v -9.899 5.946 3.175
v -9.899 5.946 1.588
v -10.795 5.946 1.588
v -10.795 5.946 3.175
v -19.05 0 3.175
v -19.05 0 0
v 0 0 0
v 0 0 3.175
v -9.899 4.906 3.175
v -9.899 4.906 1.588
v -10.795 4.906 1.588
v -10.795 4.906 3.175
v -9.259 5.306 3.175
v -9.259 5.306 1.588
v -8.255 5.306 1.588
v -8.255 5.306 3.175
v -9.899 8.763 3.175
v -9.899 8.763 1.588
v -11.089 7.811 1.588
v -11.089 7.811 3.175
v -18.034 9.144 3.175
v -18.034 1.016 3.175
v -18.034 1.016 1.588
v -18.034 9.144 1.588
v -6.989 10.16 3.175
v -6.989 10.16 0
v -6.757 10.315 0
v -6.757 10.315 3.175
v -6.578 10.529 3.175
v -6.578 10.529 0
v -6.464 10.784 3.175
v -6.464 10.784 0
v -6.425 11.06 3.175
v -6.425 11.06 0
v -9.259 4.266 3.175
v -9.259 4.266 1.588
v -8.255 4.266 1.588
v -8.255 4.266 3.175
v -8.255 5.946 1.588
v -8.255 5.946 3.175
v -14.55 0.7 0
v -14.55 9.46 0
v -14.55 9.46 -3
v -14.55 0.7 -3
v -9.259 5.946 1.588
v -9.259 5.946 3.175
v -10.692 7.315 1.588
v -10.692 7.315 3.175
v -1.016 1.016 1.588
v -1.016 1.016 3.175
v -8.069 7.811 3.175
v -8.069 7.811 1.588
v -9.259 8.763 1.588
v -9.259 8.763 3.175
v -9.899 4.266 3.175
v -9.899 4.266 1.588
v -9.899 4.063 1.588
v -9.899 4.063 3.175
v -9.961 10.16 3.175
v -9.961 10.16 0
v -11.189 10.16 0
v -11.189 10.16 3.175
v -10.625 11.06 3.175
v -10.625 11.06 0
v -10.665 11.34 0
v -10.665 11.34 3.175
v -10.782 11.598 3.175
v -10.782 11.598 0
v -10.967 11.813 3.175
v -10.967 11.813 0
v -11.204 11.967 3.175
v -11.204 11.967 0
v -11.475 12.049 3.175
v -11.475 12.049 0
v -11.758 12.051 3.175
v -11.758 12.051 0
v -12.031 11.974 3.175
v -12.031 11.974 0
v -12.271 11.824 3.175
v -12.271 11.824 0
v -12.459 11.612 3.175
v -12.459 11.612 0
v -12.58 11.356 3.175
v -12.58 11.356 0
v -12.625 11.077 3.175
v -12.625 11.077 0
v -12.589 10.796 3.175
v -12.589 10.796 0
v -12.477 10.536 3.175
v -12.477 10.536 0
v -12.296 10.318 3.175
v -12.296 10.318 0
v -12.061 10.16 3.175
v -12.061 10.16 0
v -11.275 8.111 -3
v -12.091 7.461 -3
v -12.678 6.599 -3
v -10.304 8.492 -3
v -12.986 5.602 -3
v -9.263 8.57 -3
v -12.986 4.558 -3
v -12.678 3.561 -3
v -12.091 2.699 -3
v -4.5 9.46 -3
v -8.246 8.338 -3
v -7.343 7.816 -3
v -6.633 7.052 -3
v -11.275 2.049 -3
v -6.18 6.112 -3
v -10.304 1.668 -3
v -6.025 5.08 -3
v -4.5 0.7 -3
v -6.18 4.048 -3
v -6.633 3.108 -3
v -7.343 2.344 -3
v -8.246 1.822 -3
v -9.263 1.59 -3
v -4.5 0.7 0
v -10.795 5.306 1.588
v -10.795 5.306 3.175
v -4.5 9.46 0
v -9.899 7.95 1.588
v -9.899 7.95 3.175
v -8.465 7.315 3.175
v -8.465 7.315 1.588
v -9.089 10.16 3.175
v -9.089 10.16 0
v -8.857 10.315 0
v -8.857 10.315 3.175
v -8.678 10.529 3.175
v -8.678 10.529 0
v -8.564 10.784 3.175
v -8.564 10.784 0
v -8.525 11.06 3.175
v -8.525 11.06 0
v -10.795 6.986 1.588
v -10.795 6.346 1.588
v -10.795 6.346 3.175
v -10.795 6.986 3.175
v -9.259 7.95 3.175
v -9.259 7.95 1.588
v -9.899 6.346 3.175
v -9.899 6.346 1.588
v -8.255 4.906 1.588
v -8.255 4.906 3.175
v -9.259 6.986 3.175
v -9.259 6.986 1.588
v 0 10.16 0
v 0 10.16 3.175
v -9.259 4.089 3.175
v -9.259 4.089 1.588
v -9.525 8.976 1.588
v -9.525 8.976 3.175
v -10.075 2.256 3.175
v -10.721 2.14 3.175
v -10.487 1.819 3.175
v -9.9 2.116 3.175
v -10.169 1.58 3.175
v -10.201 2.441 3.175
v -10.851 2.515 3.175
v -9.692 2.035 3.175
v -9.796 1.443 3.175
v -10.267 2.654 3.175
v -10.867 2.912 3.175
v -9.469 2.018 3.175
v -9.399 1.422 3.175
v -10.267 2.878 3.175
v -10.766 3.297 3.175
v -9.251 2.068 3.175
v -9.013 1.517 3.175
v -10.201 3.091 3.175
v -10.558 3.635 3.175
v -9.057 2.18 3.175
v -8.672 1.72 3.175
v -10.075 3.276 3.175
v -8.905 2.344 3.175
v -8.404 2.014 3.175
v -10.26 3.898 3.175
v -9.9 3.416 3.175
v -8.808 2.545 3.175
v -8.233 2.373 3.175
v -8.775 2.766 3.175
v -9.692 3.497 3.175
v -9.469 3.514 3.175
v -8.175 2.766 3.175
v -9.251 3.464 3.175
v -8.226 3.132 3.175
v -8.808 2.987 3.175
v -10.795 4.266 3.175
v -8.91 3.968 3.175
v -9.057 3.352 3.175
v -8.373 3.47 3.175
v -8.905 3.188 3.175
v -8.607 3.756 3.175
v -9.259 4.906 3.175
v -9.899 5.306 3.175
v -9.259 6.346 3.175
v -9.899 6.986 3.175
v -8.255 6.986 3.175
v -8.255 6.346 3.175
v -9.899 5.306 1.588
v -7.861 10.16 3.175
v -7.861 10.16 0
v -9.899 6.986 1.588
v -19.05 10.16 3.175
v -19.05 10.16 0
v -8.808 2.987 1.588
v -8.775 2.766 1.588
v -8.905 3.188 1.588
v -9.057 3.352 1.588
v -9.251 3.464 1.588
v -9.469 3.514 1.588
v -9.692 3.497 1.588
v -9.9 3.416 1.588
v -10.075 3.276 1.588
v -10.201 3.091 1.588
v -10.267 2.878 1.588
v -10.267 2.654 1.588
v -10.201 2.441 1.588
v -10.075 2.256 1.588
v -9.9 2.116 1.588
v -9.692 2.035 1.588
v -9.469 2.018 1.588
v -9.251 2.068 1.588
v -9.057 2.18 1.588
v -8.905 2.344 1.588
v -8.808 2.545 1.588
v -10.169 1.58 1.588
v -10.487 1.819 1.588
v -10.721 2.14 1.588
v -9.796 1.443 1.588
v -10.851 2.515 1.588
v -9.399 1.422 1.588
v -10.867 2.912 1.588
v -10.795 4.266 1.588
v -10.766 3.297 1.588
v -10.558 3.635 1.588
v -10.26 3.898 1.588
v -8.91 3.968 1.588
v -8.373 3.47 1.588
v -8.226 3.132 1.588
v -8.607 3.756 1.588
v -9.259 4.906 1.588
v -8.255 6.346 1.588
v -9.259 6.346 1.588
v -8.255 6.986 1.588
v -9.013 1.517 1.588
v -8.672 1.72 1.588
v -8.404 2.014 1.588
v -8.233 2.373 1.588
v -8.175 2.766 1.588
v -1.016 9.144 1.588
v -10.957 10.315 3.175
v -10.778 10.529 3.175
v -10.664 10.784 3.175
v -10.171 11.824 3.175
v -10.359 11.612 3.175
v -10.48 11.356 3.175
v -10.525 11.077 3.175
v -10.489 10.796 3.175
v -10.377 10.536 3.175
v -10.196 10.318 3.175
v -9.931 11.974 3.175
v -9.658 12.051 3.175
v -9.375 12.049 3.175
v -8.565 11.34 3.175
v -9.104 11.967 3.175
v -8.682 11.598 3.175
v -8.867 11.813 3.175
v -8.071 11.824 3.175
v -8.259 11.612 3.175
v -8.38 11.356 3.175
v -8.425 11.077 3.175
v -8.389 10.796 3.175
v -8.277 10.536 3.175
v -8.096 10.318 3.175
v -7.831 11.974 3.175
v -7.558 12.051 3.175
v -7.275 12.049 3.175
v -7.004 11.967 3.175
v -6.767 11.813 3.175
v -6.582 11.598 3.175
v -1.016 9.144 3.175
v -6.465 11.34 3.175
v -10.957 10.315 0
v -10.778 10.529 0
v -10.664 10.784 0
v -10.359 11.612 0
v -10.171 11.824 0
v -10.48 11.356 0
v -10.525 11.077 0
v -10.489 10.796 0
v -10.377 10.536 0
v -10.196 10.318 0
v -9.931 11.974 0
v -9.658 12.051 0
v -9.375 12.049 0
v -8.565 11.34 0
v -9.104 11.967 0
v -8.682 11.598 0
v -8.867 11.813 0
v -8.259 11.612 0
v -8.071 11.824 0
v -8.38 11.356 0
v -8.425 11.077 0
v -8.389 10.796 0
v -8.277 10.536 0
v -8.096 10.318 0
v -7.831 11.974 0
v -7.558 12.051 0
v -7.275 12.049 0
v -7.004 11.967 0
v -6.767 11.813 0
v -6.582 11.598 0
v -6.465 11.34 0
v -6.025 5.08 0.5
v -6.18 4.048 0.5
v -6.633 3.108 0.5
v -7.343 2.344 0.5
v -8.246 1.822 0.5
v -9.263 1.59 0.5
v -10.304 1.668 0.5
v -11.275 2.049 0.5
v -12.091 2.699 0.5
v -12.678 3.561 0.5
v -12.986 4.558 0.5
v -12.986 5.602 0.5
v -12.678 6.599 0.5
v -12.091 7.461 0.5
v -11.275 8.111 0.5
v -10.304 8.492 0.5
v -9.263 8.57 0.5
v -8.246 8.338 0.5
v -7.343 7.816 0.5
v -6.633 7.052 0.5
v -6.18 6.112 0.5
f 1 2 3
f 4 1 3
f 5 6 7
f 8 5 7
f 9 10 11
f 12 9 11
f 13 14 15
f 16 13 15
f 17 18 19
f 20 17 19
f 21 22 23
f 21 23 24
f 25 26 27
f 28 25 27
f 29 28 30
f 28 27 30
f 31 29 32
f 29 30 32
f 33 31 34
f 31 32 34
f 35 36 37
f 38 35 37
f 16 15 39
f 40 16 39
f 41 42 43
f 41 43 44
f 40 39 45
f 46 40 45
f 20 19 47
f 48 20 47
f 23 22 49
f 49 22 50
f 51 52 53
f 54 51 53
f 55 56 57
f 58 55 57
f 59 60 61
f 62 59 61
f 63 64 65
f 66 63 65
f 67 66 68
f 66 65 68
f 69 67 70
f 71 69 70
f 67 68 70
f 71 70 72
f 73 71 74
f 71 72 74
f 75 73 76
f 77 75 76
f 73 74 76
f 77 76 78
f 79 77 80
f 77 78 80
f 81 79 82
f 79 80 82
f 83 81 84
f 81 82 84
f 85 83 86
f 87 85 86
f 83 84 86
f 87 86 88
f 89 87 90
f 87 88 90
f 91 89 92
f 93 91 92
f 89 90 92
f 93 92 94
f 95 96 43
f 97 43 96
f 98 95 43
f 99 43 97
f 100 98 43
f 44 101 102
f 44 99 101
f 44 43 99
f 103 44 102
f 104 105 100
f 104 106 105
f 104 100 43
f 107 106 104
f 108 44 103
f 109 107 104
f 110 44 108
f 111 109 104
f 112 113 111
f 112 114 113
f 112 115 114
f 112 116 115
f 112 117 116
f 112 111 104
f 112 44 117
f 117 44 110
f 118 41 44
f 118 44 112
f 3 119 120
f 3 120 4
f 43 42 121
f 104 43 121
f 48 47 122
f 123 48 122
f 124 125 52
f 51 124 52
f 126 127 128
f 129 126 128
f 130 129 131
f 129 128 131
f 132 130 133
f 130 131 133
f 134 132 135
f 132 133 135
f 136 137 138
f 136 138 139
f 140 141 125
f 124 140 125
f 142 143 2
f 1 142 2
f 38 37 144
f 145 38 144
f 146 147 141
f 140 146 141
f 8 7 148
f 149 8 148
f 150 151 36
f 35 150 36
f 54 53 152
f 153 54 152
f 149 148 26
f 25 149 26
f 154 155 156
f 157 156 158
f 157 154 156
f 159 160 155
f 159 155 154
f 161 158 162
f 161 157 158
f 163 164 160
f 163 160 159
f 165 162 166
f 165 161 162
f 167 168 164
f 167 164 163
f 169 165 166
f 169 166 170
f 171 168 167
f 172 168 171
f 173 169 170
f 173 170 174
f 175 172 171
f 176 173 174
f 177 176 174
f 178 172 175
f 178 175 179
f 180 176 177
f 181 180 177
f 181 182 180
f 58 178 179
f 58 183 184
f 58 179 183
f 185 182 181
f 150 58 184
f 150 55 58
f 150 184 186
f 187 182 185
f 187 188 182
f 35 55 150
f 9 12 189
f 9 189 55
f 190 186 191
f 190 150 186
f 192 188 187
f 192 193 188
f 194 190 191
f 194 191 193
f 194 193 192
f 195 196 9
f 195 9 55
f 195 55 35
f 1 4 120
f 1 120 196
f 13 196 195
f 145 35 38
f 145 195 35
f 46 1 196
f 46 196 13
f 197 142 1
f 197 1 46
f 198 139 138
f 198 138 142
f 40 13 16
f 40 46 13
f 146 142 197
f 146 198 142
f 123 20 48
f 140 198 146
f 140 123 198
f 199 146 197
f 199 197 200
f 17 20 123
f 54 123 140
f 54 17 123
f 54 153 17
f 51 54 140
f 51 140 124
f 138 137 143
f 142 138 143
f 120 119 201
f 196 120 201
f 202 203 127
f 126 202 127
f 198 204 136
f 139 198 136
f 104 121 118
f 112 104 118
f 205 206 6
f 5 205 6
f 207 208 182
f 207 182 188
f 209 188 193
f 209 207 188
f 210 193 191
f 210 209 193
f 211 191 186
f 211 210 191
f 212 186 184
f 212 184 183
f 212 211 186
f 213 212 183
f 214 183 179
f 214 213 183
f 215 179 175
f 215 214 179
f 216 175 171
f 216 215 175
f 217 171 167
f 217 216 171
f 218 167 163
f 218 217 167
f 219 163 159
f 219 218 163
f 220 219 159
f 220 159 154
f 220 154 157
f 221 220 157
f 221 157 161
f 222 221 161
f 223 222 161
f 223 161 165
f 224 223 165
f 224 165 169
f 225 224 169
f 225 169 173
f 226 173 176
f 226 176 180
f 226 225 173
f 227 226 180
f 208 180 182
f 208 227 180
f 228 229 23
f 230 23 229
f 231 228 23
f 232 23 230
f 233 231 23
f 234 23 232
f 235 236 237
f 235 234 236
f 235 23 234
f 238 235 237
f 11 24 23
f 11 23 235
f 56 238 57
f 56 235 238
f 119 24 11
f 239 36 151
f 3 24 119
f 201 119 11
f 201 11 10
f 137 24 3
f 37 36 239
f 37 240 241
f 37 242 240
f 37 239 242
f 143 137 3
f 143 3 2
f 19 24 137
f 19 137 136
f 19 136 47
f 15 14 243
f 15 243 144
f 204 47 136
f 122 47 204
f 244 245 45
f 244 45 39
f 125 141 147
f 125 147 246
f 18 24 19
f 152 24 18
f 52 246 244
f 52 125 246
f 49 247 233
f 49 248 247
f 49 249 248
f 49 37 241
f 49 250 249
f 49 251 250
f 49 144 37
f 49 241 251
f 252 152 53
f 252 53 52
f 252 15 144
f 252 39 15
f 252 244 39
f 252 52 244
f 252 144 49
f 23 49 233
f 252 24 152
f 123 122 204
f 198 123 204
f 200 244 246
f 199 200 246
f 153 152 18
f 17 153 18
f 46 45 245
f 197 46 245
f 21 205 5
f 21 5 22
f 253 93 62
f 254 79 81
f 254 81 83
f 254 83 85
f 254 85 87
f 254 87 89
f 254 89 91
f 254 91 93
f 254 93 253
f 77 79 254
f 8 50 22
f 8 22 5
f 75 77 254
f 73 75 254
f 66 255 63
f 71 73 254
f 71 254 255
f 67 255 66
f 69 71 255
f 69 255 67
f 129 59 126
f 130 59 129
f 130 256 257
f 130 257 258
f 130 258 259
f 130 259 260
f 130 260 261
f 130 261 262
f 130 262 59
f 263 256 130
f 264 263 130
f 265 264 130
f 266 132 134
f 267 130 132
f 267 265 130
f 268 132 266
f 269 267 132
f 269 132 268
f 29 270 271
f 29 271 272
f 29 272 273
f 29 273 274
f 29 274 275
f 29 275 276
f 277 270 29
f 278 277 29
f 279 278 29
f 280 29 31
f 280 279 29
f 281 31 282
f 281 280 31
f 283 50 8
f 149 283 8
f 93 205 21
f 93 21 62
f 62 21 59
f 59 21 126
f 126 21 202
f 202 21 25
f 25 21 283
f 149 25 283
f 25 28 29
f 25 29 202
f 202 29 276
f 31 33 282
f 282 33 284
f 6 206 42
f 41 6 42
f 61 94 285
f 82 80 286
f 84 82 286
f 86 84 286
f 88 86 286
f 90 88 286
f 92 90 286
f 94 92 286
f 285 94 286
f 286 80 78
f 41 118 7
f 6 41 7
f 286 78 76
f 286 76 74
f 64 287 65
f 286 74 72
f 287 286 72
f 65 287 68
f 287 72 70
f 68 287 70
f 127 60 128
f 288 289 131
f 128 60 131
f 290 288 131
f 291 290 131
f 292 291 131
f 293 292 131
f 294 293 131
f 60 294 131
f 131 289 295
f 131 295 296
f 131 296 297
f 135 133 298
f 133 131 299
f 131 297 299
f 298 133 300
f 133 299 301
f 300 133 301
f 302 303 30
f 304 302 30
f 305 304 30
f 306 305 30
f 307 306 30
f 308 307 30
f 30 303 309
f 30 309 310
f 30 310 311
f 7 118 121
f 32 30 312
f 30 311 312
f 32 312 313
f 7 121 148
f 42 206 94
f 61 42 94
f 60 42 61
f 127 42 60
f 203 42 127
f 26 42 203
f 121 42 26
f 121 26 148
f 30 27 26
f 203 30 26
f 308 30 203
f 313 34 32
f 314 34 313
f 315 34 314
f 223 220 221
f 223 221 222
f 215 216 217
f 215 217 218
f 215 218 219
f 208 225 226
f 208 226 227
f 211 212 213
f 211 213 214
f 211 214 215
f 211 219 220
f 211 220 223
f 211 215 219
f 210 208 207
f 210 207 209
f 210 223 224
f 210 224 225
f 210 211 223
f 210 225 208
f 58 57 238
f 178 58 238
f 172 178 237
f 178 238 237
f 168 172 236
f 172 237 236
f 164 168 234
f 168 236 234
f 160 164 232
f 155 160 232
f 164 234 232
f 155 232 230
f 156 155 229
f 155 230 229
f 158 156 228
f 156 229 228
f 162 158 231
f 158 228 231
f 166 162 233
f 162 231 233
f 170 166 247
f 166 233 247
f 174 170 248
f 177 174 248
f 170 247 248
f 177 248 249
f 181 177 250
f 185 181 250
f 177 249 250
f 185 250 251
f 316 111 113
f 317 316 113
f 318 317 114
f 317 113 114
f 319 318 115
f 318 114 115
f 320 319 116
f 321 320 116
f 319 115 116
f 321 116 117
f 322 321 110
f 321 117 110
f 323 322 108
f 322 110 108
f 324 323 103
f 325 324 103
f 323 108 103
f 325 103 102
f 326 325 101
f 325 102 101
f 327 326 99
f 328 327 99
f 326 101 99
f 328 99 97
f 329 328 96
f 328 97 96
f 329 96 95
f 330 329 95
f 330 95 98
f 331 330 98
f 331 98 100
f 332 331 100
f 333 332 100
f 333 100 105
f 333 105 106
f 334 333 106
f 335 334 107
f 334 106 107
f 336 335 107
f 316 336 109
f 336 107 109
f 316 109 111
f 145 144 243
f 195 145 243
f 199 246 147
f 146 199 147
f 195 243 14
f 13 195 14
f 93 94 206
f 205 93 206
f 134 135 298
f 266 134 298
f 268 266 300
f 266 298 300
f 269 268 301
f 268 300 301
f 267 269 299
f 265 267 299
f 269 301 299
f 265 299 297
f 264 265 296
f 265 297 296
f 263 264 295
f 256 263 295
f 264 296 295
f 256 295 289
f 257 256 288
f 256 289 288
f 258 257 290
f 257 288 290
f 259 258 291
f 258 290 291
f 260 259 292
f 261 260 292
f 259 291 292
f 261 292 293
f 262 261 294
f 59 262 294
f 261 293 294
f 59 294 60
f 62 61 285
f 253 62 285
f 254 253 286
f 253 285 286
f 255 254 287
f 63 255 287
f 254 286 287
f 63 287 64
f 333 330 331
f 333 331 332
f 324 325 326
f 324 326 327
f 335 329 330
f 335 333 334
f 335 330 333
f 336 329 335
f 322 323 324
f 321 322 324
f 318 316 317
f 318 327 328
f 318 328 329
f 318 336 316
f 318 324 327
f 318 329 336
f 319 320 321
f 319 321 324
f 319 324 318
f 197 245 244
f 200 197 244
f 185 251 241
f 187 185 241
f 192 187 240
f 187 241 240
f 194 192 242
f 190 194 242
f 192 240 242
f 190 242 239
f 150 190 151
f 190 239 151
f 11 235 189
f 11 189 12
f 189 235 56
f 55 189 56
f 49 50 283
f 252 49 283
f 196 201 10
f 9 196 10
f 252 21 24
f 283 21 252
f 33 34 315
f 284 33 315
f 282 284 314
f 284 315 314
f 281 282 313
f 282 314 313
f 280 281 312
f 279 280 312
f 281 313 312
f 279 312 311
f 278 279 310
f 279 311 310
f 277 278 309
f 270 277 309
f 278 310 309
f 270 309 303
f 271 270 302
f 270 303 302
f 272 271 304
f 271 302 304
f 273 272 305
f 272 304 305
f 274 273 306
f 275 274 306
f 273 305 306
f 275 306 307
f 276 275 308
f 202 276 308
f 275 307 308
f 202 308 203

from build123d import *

# Parameters (mm, degrees)
F1_DEPTH = 3.175
F2_W     = 17.018
F2_H     = 8.128
F3_DEPTH = 1.5875
F4_W     = 10.05
F4_H     = 8.76
F5_DEPTH = 3
F6_R     = 3.5
F7_DEPTH = 3.5
F8_R     = 0.75
F8_W     = 0.64
F8_H     = 0.64
F8_W_2   = 1.0036083104
F8_W_3   = 0.8963916896
F8_H_2   = 0.4
F9_DEPTH = 1.5875


with BuildPart() as f1:
    # F0 (on Top) → F1 (new body)
    with BuildSketch(Plane.XY):
        with BuildLine():
            Line((-12.0608898944, 10.16), (-19.05, 10.16))
            Line((-19.05, 10.16), (-19.05, 0))
            Line((-19.05, 0), (0, 0))
            Line((0, 0), (0, 10.16))
            Line((0, 10.16), (-6.9891101056, 10.16))
            ThreePointArc((-6.9891101056, 10.16), (-7.425, 10.06), (-7.8608898944, 10.16))
            Line((-7.8608898944, 10.16), (-9.0891101056, 10.16))
            ThreePointArc((-9.0891101056, 10.16), (-9.525, 10.06), (-9.9608898944, 10.16))
            Line((-9.9608898944, 10.16), (-11.1891101056, 10.16))
            ThreePointArc((-11.1891101056, 10.16), (-11.625, 10.06), (-12.0608898944, 10.16))
        make_face()
        with BuildLine():
            ThreePointArc((-10.625, 11.06), (-12.1560885546, 11.9073163206), (-12.0608898944, 10.16))
            Line((-12.0608898944, 10.16), (-11.1891101056, 10.16))
            ThreePointArc((-11.1891101056, 10.16), (-10.7776836794, 10.5289114454), (-10.625, 11.06))
        make_face()
        with BuildLine():
            Line((-11.1891101056, 10.16), (-12.0608898944, 10.16))
            ThreePointArc((-12.0608898944, 10.16), (-11.625, 10.06), (-11.1891101056, 10.16))
        make_face()
        with BuildLine():
            ThreePointArc((-8.525, 11.06), (-10.0560885546, 11.9073163206), (-9.9608898944, 10.16))
            Line((-9.9608898944, 10.16), (-9.0891101056, 10.16))
            ThreePointArc((-9.0891101056, 10.16), (-8.6776836794, 10.5289114454), (-8.525, 11.06))
        make_face()
        with BuildLine():
            Line((-9.0891101056, 10.16), (-9.9608898944, 10.16))
            ThreePointArc((-9.9608898944, 10.16), (-9.525, 10.06), (-9.0891101056, 10.16))
        make_face()
        with BuildLine():
            ThreePointArc((-7.8608898944, 10.16), (-7.425, 10.06), (-6.9891101056, 10.16))
            Line((-6.9891101056, 10.16), (-7.8608898944, 10.16))
        make_face()
        with BuildLine():
            Line((-7.8608898944, 10.16), (-6.9891101056, 10.16))
            ThreePointArc((-6.9891101056, 10.16), (-6.5776836794, 10.5289114454), (-6.425, 11.06))
            ThreePointArc((-6.425, 11.06), (-7.9560885546, 11.9073163206), (-7.8608898944, 10.16))
        make_face()
    extrude(amount=F1_DEPTH)

    # F2 (on face) → F3 (cut)
    with BuildSketch(Plane.XY.offset(3.175)):
        with Locations((-9.525, 5.08)):
            Rectangle(F2_W, F2_H)
    extrude(amount=-F3_DEPTH, mode=Mode.SUBTRACT)

    # F4 (on face) → F5 (join)
    with BuildSketch(Plane(origin=(0, 0, 0), x_dir=(1, 0, 0), z_dir=(0, 0, -1))):
        with Locations((-9.525, -5.08)):
            Rectangle(F4_W, F4_H)
    extrude(amount=F5_DEPTH)

    # F6 (on face) → F7 (cut)
    with BuildSketch(Plane(origin=(0, 0, -3), x_dir=(1, 0, 0), z_dir=(0, 0, -1))):
        with Locations((-9.525, -5.08)):
            Circle(F6_R)
    extrude(amount=-F7_DEPTH, mode=Mode.SUBTRACT)

    # F8 (on face) → F9 (join, through all)
    with BuildSketch(Plane.XY.offset(1.5875)):
        with BuildLine():
            ThreePointArc((-9.8986083104, 4.0632728435), (-10.3368278084, 1.6873732761), (-8.175, 2.766))
            ThreePointArc((-8.175, 2.766), (-8.4804597229, 3.6212400888), (-9.2586083104, 4.0894558805))
            ThreePointArc((-9.2586083104, 4.0894558805), (-9.5801836824, 4.1148716622), (-9.8986083104, 4.0632728435))
        make_face()
        with Locations((-9.525, 2.766)):
            Circle(F8_R, mode=Mode.SUBTRACT)
        with BuildLine():
            ThreePointArc((-9.8986083104, 4.0632728435), (-9.5801836824, 4.1148716622), (-9.2586083104, 4.0894558805))
            Line((-9.2586083104, 4.0894558805), (-9.2586083104, 4.266))
            Line((-9.2586083104, 4.266), (-9.8986083104, 4.266))
            Line((-9.8986083104, 4.266), (-9.8986083104, 4.0632728435))
        make_face()
        with Locations((-9.5786083104, 4.586)):
            Rectangle(F8_W, F8_H)
        with Locations((-8.7568041552, 4.586)):
            Rectangle(F8_W_2, F8_H)
        with Locations((-10.3468041552, 4.586)):
            Rectangle(F8_W_3, F8_H)
        with Locations((-9.5786083104, 5.106)):
            Rectangle(F8_W, F8_H_2)
        with Locations((-9.5786083104, 5.626)):
            Rectangle(F8_W, F8_H)
        with Locations((-8.7568041552, 5.626)):
            Rectangle(F8_W_2, F8_H)
        with Locations((-10.3468041552, 5.626)):
            Rectangle(F8_W_3, F8_H)
        with Locations((-9.5786083104, 6.146)):
            Rectangle(F8_W, F8_H_2)
        with Locations((-9.5786083104, 6.666)):
            Rectangle(F8_W, F8_H)
        with Locations((-8.7568041552, 6.666)):
            Rectangle(F8_W_2, F8_H)
        with Locations((-10.3468041552, 6.666)):
            Rectangle(F8_W_3, F8_H)
        Polygon((-9.8986083104, 6.986), (-9.2586083104, 6.986), (-9.2586083104, 7.9498032218), (-9.2586083104, 8.763), (-9.8986083104, 8.763), (-9.8986083104, 7.9498032218), align=None)
        Polygon((-9.2586083104, 8.763), (-9.2586083104, 7.9498032218), (-8.4652456, 7.3151130535), (-8.0685642448, 7.8109647475), align=None)
        Polygon((-10.6919710208, 7.3151130535), (-9.8986083104, 7.9498032218), (-9.8986083104, 8.763), (-11.088652376, 7.8109647475), align=None)
        Polygon((-9.8986083104, 8.763), (-9.2586083104, 8.763), (-9.525, 8.9761133517), align=None)
    extrude(amount=F9_DEPTH)


solid = f1.part
